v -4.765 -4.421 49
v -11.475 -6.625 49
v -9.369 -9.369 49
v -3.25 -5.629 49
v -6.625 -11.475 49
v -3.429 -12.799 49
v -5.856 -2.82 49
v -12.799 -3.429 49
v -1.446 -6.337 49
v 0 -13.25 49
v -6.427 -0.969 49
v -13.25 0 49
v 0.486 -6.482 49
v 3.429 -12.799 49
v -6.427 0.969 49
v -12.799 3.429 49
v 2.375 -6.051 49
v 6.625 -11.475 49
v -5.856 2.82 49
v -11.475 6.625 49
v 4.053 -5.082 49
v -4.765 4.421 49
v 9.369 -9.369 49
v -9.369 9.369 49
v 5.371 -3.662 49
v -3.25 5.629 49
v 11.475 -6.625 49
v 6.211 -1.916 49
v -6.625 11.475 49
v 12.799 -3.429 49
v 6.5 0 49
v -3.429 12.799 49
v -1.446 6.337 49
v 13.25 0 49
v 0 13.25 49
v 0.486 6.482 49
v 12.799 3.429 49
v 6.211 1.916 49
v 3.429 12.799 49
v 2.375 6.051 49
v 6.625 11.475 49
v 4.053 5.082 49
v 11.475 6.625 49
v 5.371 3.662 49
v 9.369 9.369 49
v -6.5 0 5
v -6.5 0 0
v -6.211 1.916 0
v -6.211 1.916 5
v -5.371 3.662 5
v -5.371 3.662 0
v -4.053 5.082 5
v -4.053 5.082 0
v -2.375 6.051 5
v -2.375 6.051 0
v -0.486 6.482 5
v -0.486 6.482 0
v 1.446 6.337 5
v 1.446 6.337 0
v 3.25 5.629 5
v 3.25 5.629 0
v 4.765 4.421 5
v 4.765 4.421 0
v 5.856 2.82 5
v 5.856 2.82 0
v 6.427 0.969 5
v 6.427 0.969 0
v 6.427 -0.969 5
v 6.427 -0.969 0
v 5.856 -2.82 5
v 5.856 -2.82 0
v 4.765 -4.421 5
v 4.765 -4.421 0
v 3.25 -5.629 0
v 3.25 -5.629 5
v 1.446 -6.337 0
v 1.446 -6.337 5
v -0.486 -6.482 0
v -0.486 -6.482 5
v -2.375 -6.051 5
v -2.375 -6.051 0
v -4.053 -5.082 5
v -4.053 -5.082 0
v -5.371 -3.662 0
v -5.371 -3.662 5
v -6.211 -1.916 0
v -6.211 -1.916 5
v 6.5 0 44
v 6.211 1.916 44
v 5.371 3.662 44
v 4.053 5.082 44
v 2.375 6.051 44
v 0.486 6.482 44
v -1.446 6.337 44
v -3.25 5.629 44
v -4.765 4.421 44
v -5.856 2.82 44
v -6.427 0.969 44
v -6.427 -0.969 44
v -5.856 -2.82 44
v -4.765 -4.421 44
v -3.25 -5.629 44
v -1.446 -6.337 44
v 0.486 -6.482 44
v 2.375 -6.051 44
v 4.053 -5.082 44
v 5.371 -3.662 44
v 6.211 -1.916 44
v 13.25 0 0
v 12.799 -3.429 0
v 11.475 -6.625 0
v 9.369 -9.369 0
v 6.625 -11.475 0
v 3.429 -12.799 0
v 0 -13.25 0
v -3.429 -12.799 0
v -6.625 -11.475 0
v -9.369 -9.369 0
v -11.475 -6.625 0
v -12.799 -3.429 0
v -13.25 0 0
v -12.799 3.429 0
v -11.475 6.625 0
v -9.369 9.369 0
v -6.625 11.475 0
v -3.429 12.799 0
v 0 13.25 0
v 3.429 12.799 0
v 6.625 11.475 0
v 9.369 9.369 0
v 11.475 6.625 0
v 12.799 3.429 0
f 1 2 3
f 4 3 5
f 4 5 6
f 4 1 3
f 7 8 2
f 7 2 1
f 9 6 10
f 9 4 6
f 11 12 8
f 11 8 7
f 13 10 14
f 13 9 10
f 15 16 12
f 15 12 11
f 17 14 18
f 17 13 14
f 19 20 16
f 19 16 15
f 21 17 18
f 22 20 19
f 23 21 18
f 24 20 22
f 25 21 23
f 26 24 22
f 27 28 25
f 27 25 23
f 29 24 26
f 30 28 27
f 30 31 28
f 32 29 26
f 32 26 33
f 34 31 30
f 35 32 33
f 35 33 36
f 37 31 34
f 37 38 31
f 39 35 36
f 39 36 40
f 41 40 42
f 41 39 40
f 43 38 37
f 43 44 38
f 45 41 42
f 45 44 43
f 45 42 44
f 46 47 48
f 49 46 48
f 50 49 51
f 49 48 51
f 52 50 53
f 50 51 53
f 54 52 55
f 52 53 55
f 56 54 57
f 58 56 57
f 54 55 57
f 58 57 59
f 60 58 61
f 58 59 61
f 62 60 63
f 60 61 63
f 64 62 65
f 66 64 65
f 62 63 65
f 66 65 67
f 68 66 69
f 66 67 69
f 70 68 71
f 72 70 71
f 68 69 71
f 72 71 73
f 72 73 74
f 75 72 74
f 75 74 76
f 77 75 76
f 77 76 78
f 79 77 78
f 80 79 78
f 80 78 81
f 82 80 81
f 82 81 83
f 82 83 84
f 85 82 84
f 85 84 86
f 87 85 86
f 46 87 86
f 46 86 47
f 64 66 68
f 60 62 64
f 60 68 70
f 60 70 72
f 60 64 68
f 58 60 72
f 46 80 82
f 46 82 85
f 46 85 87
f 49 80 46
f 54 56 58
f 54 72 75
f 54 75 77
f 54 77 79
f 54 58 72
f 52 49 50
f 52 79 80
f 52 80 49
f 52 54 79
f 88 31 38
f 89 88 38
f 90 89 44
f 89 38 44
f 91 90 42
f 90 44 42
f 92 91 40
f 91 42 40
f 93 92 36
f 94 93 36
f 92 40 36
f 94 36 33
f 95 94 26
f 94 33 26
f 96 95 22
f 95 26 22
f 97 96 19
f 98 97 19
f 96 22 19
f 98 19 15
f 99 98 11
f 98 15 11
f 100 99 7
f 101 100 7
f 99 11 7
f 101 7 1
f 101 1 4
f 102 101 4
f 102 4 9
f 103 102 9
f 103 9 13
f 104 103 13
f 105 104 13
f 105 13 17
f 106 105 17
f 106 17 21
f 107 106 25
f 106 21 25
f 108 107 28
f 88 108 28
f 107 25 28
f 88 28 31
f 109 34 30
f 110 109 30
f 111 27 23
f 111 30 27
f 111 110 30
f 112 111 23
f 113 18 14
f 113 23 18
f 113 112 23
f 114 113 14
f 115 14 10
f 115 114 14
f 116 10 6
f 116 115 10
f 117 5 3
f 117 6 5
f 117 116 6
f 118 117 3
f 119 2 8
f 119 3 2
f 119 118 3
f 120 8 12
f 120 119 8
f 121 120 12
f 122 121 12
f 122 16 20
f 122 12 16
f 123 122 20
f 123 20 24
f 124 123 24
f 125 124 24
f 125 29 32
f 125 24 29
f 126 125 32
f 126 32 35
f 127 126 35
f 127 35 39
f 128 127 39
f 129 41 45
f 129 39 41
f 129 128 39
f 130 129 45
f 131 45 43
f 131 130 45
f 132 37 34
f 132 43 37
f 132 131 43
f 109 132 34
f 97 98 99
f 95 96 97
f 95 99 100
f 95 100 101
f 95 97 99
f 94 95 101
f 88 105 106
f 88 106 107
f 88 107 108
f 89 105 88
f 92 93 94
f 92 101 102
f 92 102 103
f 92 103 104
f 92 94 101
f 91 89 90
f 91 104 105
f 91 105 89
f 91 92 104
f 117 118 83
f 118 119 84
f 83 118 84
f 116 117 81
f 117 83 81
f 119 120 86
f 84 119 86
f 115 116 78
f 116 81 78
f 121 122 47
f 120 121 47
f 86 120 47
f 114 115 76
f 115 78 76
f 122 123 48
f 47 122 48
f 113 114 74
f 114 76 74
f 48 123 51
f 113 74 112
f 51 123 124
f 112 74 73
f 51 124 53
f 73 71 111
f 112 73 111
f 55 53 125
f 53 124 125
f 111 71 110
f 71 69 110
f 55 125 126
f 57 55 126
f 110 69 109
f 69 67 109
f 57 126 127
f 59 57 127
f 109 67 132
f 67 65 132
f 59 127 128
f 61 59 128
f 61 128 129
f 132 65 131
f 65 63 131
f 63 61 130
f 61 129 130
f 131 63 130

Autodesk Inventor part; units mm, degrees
ref_plane "YZ Plane" through (0, 0, 0) normal (1, 0, 0) x (0, 1, 0)
ref_plane "XZ Plane" through (0, 0, 0) normal (0, 1, 0) x (-1, 0, 0)
ref_plane "XY Plane" through (0, 0, 0) normal (0, 0, 1) x (1, 0, 0)
sketch "Boceto1" plane through (0, 0, 0) normal (0, 0, 1) x (1, 0, 0)
  circle A0 centre (0, 0) radius 13.25
  dimension "d0" = 26.5
extrude "Extrusión1" add sketch "Boceto1" along normal blind 49
sketch "Boceto2" plane through (0, 0, 49) normal (0, 0, 1) x (1, 0, 0)
  circle A0 centre (0, 0) radius 6.5
  dimension "d3" = 13
extrude "Extrusión2" cut sketch "Boceto2" against normal blind 5
sketch "Boceto3" plane through (0, 0, 0) normal (0, 0, -1) x (-1, 0, 0)
  circle A0 centre (0, 0) radius 6.5
  dimension "d6" = 13
extrude "Extrusión3" cut sketch "Boceto3" against normal blind 5
sketch "Boceto4" plane through (0, 0, 5) normal (0, 0, -1) x (-1, 0, 0)
  point P0 (0, 0)
  point P1 (0, 0)
sketch "Boceto5" plane through (0, 0, 44) normal (0, 0, 1) x (1, 0, 0)
  circle A0 centre (0, 0) radius 6.5 projected
properties part number "CuerpoPrincipal_filtro"
